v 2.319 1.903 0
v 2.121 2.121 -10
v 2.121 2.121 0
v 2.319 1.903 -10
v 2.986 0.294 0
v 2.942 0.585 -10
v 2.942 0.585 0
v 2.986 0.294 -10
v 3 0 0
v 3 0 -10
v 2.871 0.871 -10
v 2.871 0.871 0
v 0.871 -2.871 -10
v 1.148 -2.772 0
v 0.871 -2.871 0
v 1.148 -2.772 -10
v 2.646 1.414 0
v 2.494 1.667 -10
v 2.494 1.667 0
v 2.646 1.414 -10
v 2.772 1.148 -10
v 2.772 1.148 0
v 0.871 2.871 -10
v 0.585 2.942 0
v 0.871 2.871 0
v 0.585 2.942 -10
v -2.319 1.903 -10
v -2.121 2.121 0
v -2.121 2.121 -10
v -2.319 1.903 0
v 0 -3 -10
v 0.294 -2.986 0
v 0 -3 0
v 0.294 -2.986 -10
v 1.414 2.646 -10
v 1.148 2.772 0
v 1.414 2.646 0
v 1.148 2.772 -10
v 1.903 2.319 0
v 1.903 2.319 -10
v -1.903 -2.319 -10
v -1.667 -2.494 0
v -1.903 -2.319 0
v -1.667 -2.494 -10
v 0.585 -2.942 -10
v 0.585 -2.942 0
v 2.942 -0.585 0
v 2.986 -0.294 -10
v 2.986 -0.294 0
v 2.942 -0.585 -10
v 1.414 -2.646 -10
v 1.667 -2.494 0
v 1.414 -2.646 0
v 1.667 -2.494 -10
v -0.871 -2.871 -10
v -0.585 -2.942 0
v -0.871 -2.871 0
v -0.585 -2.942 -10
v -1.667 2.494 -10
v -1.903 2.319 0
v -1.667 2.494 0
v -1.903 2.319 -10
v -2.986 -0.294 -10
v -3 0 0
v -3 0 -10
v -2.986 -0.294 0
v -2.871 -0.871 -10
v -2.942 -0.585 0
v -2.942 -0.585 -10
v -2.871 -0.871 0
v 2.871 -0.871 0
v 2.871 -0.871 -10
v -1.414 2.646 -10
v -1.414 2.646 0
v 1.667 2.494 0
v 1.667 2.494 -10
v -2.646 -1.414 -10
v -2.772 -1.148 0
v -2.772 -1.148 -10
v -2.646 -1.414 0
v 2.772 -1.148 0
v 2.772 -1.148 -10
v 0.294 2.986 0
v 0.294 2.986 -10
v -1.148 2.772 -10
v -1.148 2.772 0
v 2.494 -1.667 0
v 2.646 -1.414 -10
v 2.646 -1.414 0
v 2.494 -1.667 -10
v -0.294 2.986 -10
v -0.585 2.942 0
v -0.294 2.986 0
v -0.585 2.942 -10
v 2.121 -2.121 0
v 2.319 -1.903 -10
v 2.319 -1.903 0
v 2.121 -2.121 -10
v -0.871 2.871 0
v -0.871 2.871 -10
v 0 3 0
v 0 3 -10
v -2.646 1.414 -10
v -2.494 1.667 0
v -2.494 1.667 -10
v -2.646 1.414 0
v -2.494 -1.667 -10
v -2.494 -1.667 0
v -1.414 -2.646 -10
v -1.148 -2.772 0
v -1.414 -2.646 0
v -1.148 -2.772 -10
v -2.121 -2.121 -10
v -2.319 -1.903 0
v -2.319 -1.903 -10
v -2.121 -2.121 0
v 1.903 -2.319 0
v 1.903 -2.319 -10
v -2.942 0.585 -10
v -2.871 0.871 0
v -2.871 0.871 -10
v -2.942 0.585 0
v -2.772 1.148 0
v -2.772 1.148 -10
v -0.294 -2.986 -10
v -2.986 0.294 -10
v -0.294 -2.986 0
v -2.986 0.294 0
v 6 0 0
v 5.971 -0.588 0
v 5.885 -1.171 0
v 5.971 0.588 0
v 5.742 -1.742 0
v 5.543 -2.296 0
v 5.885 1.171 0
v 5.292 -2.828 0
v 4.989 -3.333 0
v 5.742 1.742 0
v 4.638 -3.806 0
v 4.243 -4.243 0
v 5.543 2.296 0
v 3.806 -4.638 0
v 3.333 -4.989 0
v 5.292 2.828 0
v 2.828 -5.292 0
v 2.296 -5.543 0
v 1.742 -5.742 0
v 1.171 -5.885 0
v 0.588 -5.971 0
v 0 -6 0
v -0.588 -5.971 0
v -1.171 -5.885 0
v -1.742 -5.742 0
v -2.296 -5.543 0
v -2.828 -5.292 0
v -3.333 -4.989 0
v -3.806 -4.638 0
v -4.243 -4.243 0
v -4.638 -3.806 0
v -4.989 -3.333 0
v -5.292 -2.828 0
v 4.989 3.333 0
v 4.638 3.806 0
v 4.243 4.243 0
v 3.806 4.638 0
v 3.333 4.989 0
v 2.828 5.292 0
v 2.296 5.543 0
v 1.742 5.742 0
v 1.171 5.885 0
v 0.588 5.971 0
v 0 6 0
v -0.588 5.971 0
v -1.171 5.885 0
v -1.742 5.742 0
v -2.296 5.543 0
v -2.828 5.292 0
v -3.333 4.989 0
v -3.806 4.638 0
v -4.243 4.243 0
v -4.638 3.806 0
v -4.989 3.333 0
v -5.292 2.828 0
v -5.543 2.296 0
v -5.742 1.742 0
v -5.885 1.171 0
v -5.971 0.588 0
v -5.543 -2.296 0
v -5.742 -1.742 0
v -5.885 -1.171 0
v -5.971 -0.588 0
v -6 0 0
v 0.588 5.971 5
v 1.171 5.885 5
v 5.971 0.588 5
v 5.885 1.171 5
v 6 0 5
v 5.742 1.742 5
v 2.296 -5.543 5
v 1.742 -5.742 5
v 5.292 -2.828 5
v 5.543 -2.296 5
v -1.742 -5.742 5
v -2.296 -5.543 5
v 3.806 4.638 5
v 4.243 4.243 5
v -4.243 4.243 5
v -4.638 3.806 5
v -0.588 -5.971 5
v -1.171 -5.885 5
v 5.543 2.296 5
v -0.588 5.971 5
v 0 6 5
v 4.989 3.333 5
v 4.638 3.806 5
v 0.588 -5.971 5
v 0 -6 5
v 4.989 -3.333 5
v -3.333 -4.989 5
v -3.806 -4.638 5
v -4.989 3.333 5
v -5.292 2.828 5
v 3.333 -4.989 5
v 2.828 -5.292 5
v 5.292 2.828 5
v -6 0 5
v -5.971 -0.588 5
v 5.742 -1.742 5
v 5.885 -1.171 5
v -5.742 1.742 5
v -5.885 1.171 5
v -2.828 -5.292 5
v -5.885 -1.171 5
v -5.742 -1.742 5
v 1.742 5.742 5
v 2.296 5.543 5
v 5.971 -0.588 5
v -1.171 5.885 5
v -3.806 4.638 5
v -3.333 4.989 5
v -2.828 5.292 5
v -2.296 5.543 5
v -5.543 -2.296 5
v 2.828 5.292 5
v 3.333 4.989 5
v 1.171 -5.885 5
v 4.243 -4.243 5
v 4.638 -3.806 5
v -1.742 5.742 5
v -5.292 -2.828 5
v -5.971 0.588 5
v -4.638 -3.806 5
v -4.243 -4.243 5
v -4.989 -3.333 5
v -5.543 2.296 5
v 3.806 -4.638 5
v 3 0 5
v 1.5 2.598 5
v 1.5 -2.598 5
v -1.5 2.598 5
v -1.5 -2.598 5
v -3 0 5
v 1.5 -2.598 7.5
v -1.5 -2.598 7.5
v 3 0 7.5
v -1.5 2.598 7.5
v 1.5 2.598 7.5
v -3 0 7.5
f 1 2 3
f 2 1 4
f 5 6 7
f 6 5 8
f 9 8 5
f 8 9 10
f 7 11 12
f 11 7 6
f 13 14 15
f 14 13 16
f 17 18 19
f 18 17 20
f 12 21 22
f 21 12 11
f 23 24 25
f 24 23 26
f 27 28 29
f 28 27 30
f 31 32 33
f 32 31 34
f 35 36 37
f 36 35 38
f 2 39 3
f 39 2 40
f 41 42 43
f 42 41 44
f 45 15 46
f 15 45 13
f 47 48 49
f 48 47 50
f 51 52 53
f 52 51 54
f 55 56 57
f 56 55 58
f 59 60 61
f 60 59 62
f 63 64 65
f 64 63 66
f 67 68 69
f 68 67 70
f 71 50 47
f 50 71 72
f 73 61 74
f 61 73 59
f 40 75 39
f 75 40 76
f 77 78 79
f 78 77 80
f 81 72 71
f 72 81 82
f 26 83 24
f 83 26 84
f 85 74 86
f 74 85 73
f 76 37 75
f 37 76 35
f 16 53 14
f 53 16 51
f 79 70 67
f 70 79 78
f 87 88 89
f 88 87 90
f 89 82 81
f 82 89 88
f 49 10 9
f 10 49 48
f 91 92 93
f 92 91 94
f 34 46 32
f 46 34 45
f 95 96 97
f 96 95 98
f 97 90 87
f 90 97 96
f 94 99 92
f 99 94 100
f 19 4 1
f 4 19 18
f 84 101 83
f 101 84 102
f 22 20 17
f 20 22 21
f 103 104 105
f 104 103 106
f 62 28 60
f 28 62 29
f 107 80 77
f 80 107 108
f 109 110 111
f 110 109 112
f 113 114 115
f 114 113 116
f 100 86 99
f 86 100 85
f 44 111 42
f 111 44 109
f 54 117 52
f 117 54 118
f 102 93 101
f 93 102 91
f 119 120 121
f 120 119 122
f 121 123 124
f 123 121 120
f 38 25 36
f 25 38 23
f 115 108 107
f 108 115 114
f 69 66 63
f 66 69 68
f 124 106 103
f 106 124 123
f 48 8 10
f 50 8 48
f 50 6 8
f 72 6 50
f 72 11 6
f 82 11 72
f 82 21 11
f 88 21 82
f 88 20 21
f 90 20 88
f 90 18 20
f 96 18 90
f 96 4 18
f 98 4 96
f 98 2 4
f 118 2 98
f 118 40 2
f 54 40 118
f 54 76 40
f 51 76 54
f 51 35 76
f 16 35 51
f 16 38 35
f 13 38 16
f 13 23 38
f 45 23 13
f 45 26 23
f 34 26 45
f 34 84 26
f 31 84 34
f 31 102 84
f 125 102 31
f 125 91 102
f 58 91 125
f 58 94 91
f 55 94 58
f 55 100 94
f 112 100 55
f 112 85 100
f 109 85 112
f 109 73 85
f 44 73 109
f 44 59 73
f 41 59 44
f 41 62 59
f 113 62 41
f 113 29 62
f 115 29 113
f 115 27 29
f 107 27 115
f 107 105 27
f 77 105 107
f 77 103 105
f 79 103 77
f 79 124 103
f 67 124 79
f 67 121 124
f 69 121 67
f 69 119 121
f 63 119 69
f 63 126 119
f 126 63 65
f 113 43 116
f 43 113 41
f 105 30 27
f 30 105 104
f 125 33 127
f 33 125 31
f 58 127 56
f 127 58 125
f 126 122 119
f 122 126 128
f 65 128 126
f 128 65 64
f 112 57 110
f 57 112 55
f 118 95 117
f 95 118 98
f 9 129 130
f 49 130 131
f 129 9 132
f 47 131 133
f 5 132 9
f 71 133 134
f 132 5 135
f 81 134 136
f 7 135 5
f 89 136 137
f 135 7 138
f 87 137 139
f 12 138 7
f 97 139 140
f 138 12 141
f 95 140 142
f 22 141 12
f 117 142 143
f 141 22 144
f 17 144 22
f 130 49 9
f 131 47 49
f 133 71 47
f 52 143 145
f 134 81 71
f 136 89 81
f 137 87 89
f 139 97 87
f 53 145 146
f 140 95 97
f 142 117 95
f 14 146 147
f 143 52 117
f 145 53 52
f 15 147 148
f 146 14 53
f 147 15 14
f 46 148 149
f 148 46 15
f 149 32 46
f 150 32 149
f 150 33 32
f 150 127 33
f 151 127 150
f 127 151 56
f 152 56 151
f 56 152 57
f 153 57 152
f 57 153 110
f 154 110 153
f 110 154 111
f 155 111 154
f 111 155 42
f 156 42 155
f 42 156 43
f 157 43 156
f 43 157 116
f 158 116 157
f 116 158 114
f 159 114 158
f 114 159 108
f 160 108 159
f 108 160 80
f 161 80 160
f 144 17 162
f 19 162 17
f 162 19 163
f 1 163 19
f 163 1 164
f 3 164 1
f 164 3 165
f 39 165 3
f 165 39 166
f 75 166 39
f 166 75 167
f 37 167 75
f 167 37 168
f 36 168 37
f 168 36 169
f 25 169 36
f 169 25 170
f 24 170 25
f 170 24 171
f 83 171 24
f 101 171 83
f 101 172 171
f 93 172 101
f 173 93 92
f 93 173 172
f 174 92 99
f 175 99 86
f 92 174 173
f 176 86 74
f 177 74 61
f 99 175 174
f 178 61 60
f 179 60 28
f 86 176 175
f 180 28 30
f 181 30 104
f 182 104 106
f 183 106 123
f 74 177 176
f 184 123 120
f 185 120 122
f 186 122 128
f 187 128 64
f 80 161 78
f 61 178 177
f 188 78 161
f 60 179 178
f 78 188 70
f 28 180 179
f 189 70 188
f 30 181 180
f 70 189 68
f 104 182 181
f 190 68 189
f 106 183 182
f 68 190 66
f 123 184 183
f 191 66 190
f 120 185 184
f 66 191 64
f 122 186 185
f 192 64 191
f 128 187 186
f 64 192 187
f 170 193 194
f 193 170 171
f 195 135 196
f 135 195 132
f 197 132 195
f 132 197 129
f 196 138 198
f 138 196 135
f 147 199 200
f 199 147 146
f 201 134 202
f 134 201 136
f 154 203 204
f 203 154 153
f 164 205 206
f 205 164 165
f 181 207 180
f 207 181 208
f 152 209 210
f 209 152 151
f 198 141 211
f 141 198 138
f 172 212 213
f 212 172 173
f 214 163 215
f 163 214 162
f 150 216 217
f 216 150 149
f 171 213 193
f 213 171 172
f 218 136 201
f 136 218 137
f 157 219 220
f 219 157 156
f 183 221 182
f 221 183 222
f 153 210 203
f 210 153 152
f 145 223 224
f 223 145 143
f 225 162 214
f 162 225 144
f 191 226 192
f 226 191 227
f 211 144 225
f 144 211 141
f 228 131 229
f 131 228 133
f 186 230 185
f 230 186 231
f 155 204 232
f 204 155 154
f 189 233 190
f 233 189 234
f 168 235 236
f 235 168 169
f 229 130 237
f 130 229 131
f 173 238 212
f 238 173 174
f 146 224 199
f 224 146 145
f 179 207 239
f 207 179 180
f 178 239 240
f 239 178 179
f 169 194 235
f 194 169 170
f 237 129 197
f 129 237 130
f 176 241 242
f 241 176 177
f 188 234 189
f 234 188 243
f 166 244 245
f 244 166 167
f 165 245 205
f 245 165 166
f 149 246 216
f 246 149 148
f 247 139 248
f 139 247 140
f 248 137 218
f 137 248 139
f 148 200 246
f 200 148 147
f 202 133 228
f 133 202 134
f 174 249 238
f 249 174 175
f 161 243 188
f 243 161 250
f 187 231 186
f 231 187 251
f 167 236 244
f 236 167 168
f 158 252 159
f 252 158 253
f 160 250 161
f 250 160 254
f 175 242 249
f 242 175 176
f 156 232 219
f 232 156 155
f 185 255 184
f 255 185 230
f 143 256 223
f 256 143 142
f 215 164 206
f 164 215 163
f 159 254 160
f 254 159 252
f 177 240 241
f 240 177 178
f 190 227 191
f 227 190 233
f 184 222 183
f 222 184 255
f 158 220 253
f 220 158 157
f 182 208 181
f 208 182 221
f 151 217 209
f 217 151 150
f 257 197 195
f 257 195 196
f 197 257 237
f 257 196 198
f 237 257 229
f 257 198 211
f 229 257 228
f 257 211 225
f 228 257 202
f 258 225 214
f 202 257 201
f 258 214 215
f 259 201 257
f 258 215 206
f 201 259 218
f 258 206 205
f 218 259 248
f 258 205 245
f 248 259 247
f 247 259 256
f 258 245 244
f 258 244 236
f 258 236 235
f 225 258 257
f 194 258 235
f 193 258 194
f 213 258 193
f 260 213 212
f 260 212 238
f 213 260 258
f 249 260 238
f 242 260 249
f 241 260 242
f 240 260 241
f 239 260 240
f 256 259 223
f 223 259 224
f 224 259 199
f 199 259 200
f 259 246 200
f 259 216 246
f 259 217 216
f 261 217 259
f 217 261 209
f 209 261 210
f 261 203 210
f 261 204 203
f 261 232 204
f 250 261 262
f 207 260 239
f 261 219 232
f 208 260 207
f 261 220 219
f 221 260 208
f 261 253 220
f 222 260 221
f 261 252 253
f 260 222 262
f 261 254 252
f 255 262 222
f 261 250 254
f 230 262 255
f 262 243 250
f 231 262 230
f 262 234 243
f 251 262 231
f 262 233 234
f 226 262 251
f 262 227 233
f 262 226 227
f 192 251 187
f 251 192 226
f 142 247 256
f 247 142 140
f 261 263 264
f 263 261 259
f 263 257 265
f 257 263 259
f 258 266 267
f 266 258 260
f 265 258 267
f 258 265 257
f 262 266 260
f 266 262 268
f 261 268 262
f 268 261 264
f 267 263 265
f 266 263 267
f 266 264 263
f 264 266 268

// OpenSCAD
module socket_head_cap_screw() {
    union() {
        // Screw shaft
        translate([0, 0, -10])
            cylinder(h=10, d=6, $fn=64);
        
        // Screw head
        translate([0, 0, 0])
            cylinder(h=5, d=12, $fn=64);
        
        // Hex socket
        translate([0, 0, 2.5])
            rotate([0, 0, 0])
                cylinder(h=5, d=6, $fn=6);
    }
}

socket_head_cap_screw();
